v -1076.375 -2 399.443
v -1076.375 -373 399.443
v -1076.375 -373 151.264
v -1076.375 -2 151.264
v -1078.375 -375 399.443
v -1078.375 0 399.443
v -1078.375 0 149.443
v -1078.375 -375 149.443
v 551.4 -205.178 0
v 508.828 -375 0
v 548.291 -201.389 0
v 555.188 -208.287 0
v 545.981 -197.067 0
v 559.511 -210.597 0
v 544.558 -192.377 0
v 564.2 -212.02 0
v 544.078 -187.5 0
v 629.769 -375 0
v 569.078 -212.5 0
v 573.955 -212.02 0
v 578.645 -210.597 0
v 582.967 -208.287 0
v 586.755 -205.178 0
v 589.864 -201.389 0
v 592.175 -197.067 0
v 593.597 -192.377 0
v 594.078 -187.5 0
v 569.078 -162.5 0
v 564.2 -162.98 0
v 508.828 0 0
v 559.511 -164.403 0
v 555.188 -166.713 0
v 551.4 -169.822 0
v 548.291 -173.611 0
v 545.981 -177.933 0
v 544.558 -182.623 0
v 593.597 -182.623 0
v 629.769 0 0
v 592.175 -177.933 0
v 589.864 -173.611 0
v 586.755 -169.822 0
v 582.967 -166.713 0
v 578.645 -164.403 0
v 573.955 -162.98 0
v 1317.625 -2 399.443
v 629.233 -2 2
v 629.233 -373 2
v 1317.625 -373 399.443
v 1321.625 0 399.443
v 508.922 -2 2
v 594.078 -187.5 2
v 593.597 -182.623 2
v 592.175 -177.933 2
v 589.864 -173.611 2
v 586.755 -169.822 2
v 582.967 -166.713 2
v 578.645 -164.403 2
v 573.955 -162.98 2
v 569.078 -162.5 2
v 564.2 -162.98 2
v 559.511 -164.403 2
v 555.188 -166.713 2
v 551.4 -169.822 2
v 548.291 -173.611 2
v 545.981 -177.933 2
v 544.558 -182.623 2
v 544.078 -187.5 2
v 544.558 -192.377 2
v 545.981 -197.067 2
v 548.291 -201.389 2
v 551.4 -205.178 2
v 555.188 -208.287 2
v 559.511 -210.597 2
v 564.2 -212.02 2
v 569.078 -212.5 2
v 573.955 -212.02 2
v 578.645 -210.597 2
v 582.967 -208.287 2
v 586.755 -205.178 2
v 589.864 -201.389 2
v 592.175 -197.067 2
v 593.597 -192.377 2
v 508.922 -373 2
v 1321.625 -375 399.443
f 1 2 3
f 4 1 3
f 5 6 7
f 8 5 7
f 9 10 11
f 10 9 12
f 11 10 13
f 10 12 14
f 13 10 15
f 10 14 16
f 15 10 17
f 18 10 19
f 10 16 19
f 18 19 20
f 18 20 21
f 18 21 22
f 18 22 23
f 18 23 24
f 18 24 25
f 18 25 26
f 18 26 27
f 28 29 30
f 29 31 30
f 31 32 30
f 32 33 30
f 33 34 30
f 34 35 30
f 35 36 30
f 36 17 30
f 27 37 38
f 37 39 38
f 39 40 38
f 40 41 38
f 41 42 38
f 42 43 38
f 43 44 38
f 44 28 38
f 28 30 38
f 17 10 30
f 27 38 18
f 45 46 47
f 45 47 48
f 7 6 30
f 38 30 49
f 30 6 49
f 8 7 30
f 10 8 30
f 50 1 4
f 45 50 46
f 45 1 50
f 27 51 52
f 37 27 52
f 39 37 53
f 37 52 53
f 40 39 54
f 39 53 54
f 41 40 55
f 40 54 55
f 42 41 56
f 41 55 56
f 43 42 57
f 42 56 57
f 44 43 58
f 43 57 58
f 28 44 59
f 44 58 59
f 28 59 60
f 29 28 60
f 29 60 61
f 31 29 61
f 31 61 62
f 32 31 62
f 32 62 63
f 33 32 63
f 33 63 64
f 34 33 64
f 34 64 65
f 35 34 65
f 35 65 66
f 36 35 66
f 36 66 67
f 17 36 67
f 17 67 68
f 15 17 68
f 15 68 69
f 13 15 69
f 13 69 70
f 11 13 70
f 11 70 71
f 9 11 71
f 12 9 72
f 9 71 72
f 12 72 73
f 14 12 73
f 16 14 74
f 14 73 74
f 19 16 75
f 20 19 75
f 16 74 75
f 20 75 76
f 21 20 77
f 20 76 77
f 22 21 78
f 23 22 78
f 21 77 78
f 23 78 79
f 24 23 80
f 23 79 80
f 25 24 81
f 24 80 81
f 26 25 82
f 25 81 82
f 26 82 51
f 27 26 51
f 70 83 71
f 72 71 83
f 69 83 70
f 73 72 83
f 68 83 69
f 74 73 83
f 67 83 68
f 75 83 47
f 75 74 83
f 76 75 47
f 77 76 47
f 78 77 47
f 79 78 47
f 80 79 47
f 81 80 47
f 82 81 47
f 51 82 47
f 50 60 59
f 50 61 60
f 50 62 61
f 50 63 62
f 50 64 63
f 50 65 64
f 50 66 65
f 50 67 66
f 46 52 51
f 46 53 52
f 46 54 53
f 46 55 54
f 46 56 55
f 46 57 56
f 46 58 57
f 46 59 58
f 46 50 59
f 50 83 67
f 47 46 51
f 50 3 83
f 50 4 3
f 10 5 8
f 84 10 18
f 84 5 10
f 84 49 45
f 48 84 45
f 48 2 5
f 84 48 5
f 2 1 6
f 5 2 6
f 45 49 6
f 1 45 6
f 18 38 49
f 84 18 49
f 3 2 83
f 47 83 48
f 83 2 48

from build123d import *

# Parameters (mm, degrees)
F1_DEPTH = 375
F2_T     = -2
F3_R     = 25
F4_DEPTH = 25


with BuildPart() as f1:
    # F0 (on Front) → F1 (new body)
    with BuildSketch(Plane.XZ):
        Polygon((1321.62507, 399.443237), (-1078.37493, 399.443237), (-1078.37493, 149.443237), (508.828163, 0), (629.769089, 0), align=None)
    extrude(amount=F1_DEPTH)

    # F2
    f2_openings = [f1.faces().sort_by_distance(p)[0] for p in [
        (121.62507, -187.5, 399.443237),
    ]]
    offset(amount=F2_T, openings=f2_openings)

    # F3 (on face) → F4 (cut)
    with BuildSketch(Plane.XY.offset(2)):
        with Locations((569.07765, -187.5)):
            Circle(F3_R)
    extrude(amount=-F4_DEPTH, mode=Mode.SUBTRACT)


solid = f1.part
